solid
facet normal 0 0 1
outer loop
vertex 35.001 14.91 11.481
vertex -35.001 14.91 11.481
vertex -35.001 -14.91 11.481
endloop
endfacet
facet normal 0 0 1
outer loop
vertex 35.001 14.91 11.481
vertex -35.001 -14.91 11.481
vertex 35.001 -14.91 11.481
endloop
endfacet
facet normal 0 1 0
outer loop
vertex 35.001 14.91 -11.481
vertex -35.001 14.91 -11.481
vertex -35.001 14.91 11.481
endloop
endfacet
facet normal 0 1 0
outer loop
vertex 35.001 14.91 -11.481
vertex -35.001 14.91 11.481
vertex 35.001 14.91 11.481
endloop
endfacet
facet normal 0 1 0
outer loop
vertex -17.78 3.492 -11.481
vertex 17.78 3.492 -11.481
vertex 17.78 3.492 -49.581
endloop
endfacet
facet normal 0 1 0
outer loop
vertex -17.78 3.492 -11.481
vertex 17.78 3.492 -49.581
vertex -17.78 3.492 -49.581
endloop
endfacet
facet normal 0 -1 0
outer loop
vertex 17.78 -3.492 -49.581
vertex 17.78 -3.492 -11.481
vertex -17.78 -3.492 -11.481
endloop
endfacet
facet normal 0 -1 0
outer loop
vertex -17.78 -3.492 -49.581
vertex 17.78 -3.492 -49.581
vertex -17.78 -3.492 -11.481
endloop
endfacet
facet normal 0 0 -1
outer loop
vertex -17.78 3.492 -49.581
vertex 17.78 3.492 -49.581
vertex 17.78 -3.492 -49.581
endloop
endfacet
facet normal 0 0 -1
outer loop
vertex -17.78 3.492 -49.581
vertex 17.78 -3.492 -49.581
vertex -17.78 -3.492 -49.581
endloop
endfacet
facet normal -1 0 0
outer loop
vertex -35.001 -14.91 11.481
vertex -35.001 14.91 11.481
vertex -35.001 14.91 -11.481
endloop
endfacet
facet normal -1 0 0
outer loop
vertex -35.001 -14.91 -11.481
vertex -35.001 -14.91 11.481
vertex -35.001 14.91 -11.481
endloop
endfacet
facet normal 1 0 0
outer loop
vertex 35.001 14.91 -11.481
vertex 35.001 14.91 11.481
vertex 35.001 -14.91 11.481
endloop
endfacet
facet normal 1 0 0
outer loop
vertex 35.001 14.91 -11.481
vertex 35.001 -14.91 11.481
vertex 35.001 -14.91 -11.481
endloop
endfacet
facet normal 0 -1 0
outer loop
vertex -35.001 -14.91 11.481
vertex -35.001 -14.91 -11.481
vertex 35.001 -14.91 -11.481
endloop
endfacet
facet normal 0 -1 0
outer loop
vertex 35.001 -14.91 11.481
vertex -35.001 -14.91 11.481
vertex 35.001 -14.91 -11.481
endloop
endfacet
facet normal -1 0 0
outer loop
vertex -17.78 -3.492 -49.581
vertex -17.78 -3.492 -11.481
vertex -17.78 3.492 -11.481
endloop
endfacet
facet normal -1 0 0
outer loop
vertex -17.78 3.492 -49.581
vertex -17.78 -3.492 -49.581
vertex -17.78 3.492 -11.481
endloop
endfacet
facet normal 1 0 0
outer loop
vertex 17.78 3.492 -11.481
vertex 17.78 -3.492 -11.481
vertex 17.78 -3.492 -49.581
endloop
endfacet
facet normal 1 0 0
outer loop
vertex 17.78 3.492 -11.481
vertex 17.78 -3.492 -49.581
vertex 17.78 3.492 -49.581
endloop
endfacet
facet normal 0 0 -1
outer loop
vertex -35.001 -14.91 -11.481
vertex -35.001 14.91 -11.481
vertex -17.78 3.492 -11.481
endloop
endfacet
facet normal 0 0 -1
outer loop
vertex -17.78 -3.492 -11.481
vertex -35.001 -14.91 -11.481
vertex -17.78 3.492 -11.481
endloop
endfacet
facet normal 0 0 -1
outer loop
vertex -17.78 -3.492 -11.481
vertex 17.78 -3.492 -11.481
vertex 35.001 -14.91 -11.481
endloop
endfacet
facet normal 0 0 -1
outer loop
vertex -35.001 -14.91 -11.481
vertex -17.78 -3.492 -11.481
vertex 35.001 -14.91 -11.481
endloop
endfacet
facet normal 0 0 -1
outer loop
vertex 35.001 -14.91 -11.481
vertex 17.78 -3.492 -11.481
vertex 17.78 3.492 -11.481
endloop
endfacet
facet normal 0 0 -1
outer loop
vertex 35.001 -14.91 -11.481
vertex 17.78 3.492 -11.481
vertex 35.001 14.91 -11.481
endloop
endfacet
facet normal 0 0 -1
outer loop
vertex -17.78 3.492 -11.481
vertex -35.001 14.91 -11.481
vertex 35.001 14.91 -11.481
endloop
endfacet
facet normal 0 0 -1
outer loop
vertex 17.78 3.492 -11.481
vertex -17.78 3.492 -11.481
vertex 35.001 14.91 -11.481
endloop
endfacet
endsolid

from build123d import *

# Parameters (mm, degrees)
SKETCH1_W           = 70.0024
SKETCH1_H           = 22.9616
BOSS_EXTRUDE1_DEPTH = 14.9098
SKETCH2_W           = 35.56
SKETCH2_H           = 6.985
BOSS_EXTRUDE2_DEPTH = 38.1


with BuildPart() as part:
    # Sketch1 → Boss-Extrude1 (new, symmetric)
    with BuildSketch(Plane(origin=(0, 0, 0), x_dir=(1, 0, 0), z_dir=(0, 1, 0))):
        Rectangle(SKETCH1_W, SKETCH1_H)
    extrude(amount=BOSS_EXTRUDE1_DEPTH, both=True)

    # Sketch2 → Boss-Extrude2 (add)
    with BuildSketch(Plane(origin=(0, 0, -11.4808), x_dir=(-1, 0, 0), z_dir=(0, 0, -1))):
        Rectangle(SKETCH2_W, SKETCH2_H)
    extrude(amount=BOSS_EXTRUDE2_DEPTH)


solid = part.part
